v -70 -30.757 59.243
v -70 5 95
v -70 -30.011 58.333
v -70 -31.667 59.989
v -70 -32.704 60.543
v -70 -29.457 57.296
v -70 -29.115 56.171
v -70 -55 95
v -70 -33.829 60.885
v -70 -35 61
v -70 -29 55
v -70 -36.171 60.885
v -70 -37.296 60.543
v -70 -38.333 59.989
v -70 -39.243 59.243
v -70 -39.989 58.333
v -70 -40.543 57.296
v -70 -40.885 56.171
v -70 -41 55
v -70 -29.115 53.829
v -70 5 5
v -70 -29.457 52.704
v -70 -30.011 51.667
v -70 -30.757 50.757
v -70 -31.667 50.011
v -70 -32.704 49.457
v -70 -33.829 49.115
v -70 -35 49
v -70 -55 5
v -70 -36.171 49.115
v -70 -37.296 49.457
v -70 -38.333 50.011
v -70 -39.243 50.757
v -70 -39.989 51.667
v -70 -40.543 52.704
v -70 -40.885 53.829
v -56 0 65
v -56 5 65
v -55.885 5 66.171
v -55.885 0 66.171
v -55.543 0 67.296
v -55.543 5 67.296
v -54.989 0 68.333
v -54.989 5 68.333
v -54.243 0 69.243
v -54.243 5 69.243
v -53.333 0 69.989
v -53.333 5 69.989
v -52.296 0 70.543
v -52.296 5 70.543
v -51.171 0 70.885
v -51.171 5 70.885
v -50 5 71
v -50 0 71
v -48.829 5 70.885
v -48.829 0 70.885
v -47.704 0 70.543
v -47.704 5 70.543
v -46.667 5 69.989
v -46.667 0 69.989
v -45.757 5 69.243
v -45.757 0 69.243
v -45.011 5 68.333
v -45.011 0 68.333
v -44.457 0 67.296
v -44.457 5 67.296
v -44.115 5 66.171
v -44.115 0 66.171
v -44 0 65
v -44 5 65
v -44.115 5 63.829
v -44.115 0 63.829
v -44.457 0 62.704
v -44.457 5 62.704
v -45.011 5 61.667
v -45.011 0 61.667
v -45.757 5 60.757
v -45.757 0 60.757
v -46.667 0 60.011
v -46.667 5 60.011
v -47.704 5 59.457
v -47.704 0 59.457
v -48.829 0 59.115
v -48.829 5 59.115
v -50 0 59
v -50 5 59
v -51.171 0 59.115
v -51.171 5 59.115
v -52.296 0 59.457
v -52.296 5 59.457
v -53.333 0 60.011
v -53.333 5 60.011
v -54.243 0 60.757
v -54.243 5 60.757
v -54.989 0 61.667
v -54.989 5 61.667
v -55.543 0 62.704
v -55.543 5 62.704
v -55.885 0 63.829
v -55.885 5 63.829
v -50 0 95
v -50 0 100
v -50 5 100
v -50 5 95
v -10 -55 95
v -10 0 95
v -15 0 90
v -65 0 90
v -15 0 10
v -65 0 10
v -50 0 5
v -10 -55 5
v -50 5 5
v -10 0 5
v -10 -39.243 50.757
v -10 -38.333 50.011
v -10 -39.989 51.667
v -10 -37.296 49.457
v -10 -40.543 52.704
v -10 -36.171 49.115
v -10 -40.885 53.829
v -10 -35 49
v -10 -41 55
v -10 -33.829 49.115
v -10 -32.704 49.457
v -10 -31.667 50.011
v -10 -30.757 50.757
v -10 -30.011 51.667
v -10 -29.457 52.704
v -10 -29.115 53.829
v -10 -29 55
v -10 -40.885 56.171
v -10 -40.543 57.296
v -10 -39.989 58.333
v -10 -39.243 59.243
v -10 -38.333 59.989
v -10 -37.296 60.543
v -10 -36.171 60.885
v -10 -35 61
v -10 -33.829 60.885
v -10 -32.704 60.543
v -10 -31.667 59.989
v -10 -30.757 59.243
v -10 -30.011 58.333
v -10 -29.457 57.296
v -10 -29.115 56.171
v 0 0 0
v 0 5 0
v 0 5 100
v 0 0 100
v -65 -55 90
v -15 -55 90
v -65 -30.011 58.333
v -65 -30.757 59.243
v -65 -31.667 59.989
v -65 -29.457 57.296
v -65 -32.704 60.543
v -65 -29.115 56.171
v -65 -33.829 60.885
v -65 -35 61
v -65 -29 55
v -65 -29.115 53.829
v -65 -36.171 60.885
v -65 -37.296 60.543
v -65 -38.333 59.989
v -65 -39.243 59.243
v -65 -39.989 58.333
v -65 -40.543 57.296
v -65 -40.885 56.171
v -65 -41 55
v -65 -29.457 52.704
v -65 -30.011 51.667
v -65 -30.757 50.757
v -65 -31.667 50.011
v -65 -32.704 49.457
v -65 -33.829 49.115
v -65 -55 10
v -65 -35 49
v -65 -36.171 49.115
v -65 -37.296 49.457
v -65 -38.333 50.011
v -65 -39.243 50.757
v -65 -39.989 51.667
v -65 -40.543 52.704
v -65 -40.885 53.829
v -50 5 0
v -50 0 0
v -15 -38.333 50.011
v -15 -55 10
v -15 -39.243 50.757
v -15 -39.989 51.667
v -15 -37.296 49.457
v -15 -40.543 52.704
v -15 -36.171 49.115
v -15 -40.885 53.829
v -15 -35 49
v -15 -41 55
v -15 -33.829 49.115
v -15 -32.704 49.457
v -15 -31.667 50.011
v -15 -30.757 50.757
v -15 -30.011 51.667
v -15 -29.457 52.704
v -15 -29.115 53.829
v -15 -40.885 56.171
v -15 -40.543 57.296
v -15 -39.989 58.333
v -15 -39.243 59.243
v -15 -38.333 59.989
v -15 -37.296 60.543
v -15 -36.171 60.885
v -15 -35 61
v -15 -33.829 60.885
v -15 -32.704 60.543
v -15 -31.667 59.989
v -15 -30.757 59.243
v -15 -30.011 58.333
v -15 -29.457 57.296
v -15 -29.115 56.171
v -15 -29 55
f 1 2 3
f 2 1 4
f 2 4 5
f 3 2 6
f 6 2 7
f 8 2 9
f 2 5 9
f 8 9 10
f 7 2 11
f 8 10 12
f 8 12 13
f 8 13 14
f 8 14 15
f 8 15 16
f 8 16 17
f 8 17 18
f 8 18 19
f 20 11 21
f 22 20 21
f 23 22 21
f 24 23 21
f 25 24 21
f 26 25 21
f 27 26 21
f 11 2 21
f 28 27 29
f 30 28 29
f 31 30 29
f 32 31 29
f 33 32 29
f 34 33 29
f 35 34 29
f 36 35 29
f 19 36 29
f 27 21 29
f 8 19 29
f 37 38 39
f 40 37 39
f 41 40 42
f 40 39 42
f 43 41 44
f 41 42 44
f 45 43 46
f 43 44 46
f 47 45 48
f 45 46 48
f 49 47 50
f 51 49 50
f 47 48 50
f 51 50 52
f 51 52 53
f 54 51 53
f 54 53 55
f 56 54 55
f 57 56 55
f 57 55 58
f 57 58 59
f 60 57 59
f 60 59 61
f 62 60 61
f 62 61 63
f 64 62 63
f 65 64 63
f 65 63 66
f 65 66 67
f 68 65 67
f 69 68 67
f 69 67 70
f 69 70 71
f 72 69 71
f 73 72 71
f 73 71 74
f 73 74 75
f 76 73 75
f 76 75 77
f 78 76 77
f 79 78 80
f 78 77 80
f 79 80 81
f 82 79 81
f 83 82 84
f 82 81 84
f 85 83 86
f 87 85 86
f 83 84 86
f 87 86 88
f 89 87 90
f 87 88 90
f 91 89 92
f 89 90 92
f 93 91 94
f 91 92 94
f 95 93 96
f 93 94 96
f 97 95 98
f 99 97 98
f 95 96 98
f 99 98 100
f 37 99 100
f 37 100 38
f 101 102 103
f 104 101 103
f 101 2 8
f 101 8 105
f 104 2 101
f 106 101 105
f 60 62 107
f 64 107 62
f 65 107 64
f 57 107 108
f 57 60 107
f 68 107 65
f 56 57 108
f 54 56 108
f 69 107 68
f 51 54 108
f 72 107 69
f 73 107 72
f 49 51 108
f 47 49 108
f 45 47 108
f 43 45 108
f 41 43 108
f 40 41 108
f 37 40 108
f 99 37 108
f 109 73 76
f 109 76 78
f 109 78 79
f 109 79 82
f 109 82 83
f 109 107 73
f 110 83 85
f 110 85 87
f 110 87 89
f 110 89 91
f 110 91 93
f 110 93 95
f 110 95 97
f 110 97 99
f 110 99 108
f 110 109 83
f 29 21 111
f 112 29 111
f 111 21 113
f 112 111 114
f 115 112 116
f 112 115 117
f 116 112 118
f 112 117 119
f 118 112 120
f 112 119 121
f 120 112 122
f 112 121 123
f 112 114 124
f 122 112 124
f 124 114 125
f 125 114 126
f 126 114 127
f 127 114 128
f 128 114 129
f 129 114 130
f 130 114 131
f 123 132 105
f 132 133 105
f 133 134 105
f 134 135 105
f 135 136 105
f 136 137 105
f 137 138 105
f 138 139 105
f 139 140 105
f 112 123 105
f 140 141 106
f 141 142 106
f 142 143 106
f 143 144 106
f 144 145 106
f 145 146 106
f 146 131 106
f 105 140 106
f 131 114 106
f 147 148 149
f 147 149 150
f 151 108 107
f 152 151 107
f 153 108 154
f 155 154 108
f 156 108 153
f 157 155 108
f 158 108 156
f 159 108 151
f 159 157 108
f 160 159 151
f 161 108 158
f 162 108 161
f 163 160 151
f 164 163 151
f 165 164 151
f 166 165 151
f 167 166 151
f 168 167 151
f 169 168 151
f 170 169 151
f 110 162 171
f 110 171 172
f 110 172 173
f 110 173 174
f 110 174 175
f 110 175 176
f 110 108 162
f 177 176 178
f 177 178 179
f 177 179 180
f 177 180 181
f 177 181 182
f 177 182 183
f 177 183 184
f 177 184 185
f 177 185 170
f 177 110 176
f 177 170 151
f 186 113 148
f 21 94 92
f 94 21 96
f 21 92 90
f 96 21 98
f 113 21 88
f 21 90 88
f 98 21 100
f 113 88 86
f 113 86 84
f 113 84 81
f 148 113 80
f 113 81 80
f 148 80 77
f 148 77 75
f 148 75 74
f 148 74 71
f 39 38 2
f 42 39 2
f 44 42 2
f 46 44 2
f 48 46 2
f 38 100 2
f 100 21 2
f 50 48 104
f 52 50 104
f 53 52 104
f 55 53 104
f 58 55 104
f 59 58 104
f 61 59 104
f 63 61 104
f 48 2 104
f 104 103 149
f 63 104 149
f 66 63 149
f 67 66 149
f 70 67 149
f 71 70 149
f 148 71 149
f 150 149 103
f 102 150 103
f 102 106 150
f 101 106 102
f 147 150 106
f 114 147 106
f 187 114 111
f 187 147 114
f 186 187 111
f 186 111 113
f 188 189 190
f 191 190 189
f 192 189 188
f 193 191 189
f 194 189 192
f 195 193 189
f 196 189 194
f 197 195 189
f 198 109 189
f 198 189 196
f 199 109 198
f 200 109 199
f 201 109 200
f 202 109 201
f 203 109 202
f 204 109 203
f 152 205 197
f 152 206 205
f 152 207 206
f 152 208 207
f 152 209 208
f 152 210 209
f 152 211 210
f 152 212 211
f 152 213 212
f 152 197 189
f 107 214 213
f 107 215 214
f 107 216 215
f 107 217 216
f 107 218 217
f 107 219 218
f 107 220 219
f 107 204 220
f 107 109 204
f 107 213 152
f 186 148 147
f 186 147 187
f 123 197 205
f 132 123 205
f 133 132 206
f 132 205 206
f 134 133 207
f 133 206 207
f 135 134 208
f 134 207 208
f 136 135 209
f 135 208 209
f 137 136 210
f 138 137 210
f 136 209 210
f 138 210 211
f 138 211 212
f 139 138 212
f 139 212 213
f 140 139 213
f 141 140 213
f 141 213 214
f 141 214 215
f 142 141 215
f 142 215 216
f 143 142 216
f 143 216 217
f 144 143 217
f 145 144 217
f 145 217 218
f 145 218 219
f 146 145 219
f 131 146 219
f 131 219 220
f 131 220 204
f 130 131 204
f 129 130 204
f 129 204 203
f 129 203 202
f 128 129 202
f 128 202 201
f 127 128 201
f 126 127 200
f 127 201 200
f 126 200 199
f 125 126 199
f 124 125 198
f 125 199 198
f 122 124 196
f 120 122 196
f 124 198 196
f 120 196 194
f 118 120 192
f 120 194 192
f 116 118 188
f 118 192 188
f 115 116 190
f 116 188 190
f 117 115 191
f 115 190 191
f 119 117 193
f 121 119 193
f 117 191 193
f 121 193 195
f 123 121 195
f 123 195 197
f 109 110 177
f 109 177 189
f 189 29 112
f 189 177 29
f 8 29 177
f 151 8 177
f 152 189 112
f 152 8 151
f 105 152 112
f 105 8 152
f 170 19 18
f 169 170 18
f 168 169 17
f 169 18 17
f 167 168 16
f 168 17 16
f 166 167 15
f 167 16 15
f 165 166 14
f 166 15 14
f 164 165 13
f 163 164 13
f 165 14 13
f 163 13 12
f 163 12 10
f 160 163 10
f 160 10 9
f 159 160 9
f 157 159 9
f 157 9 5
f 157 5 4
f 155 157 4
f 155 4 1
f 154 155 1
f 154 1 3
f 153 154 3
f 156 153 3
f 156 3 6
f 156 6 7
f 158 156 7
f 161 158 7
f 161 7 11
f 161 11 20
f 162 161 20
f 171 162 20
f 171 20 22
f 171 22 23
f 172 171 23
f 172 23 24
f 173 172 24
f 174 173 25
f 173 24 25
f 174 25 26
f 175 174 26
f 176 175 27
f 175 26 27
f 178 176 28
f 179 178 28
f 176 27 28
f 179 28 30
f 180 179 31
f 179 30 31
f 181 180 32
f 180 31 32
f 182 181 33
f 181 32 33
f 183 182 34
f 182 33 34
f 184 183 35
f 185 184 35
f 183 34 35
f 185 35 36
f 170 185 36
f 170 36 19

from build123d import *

# Parameters (mm, degrees)
BOSS_EXTRUDE1_DEPTH = 100
SKETCH2_W           = 5
SKETCH2_H           = 55
CUT_EXTRUDE2_DEPTH  = 5
SKETCH3_W           = 5
SKETCH3_H           = 55
CUT_EXTRUDE3_DEPTH  = 5
SKETCH4_W           = 15
SKETCH4_H           = 5
CUT_EXTRUDE4_DEPTH  = 5
SKETCH5_W           = 15
SKETCH5_H           = 5
CUT_EXTRUDE5_DEPTH  = 5
SKETCH6_R           = 6
CUT_EXTRUDE6_DEPTH  = 10
SKETCH7_W           = 5
SKETCH7_H           = 90
BOSS_EXTRUDE2_DEPTH = 55
SKETCH8_R           = 6
CUT_EXTRUDE7_DEPTH  = 80
SKETCH9_W           = 5
SKETCH9_H           = 25
CUT_EXTRUDE8_DEPTH  = 100
SKETCH10_W          = 5
SKETCH10_H          = 5
CUT_EXTRUDE9_DEPTH  = 5
SKETCH11_W          = 5
SKETCH11_H          = 5
CUT_EXTRUDE10_DEPTH = 5
SKETCH12_W          = 50
SKETCH12_H          = 5
BOSS_EXTRUDE3_DEPTH = 55


with BuildPart() as part:
    # Sketch1 → Boss-Extrude1 (new body)
    with BuildSketch(Plane.XY):
        Polygon((0, 0), (-65, 0), (-65, -55), (-70, -55), (-70, 0), (-70, 30), (-65, 30), (-65, 5), (0, 5), align=None)
    extrude(amount=BOSS_EXTRUDE1_DEPTH)

    # Sketch2 → Cut-Extrude2 (cut)
    with BuildSketch(Plane.XY.offset(100)):
        with Locations((-67.5, -27.5)):
            Rectangle(SKETCH2_W, SKETCH2_H)
    extrude(amount=-CUT_EXTRUDE2_DEPTH, mode=Mode.SUBTRACT)

    # Sketch3 → Cut-Extrude3 (cut)
    with BuildSketch(Plane(origin=(0, 0, 0), x_dir=(-1, 0, 0), z_dir=(0, 0, -1))):
        with Locations((67.5, -27.5)):
            Rectangle(SKETCH3_W, SKETCH3_H)
    extrude(amount=-CUT_EXTRUDE3_DEPTH, mode=Mode.SUBTRACT)

    # Sketch4 → Cut-Extrude4 (cut)
    with BuildSketch(Plane.XY.offset(100)):
        with Locations((-57.5, 2.5)):
            Rectangle(SKETCH4_W, SKETCH4_H)
    extrude(amount=-CUT_EXTRUDE4_DEPTH, mode=Mode.SUBTRACT)

    # Sketch5 → Cut-Extrude5 (cut)
    with BuildSketch(Plane(origin=(0, 0, 0), x_dir=(-1, 0, 0), z_dir=(0, 0, -1))):
        with Locations((57.5, 2.5)):
            Rectangle(SKETCH5_W, SKETCH5_H)
    extrude(amount=-CUT_EXTRUDE5_DEPTH, mode=Mode.SUBTRACT)

    # Sketch6 → Cut-Extrude6 (cut)
    with BuildSketch(Plane(origin=(0, 5, 0), x_dir=(1, 0, 0), z_dir=(0, 1, 0))):
        with Locations(Location((-50, -65, 0), (0, 0, 180))):
            Circle(SKETCH6_R)
    extrude(amount=-CUT_EXTRUDE6_DEPTH, mode=Mode.SUBTRACT)

    # Sketch7 → Boss-Extrude2 (add)
    with BuildSketch(Plane.XZ):
        with Locations((-12.5, 50)):
            Rectangle(SKETCH7_W, SKETCH7_H)
    extrude(amount=BOSS_EXTRUDE2_DEPTH)

    # Sketch8 → Cut-Extrude7 (cut)
    with BuildSketch(Plane.ZY.offset(70)):
        with Locations(Location((55, -35, 0), (0, 0, 270))):
            Circle(SKETCH8_R)
    extrude(amount=-CUT_EXTRUDE7_DEPTH, mode=Mode.SUBTRACT)

    # Sketch9 → Cut-Extrude8 (cut)
    with BuildSketch(Plane.XY.offset(100)):
        with Locations((-67.5, 17.5)):
            Rectangle(SKETCH9_W, SKETCH9_H)
    extrude(amount=-CUT_EXTRUDE8_DEPTH, mode=Mode.SUBTRACT)

    # Sketch10 → Cut-Extrude9 (cut)
    with BuildSketch(Plane.XY.offset(100)):
        with Locations((-67.5, 2.5)):
            Rectangle(SKETCH10_W, SKETCH10_H)
    extrude(amount=-CUT_EXTRUDE9_DEPTH, mode=Mode.SUBTRACT)

    # Sketch11 → Cut-Extrude10 (cut)
    with BuildSketch(Plane(origin=(0, 0, 0), x_dir=(-1, 0, 0), z_dir=(0, 0, -1))):
        with Locations((67.5, 2.5)):
            Rectangle(SKETCH11_W, SKETCH11_H)
    extrude(amount=-CUT_EXTRUDE10_DEPTH, mode=Mode.SUBTRACT)

    # Sketch12 → Boss-Extrude3 (add)
    with BuildSketch(Plane.XZ):
        with Locations((-40, 7.5)):
            Rectangle(SKETCH12_W, SKETCH12_H)
        with Locations((-40, 92.5)):
            Rectangle(SKETCH12_W, SKETCH12_H)
    extrude(amount=BOSS_EXTRUDE3_DEPTH)


solid = part.part
